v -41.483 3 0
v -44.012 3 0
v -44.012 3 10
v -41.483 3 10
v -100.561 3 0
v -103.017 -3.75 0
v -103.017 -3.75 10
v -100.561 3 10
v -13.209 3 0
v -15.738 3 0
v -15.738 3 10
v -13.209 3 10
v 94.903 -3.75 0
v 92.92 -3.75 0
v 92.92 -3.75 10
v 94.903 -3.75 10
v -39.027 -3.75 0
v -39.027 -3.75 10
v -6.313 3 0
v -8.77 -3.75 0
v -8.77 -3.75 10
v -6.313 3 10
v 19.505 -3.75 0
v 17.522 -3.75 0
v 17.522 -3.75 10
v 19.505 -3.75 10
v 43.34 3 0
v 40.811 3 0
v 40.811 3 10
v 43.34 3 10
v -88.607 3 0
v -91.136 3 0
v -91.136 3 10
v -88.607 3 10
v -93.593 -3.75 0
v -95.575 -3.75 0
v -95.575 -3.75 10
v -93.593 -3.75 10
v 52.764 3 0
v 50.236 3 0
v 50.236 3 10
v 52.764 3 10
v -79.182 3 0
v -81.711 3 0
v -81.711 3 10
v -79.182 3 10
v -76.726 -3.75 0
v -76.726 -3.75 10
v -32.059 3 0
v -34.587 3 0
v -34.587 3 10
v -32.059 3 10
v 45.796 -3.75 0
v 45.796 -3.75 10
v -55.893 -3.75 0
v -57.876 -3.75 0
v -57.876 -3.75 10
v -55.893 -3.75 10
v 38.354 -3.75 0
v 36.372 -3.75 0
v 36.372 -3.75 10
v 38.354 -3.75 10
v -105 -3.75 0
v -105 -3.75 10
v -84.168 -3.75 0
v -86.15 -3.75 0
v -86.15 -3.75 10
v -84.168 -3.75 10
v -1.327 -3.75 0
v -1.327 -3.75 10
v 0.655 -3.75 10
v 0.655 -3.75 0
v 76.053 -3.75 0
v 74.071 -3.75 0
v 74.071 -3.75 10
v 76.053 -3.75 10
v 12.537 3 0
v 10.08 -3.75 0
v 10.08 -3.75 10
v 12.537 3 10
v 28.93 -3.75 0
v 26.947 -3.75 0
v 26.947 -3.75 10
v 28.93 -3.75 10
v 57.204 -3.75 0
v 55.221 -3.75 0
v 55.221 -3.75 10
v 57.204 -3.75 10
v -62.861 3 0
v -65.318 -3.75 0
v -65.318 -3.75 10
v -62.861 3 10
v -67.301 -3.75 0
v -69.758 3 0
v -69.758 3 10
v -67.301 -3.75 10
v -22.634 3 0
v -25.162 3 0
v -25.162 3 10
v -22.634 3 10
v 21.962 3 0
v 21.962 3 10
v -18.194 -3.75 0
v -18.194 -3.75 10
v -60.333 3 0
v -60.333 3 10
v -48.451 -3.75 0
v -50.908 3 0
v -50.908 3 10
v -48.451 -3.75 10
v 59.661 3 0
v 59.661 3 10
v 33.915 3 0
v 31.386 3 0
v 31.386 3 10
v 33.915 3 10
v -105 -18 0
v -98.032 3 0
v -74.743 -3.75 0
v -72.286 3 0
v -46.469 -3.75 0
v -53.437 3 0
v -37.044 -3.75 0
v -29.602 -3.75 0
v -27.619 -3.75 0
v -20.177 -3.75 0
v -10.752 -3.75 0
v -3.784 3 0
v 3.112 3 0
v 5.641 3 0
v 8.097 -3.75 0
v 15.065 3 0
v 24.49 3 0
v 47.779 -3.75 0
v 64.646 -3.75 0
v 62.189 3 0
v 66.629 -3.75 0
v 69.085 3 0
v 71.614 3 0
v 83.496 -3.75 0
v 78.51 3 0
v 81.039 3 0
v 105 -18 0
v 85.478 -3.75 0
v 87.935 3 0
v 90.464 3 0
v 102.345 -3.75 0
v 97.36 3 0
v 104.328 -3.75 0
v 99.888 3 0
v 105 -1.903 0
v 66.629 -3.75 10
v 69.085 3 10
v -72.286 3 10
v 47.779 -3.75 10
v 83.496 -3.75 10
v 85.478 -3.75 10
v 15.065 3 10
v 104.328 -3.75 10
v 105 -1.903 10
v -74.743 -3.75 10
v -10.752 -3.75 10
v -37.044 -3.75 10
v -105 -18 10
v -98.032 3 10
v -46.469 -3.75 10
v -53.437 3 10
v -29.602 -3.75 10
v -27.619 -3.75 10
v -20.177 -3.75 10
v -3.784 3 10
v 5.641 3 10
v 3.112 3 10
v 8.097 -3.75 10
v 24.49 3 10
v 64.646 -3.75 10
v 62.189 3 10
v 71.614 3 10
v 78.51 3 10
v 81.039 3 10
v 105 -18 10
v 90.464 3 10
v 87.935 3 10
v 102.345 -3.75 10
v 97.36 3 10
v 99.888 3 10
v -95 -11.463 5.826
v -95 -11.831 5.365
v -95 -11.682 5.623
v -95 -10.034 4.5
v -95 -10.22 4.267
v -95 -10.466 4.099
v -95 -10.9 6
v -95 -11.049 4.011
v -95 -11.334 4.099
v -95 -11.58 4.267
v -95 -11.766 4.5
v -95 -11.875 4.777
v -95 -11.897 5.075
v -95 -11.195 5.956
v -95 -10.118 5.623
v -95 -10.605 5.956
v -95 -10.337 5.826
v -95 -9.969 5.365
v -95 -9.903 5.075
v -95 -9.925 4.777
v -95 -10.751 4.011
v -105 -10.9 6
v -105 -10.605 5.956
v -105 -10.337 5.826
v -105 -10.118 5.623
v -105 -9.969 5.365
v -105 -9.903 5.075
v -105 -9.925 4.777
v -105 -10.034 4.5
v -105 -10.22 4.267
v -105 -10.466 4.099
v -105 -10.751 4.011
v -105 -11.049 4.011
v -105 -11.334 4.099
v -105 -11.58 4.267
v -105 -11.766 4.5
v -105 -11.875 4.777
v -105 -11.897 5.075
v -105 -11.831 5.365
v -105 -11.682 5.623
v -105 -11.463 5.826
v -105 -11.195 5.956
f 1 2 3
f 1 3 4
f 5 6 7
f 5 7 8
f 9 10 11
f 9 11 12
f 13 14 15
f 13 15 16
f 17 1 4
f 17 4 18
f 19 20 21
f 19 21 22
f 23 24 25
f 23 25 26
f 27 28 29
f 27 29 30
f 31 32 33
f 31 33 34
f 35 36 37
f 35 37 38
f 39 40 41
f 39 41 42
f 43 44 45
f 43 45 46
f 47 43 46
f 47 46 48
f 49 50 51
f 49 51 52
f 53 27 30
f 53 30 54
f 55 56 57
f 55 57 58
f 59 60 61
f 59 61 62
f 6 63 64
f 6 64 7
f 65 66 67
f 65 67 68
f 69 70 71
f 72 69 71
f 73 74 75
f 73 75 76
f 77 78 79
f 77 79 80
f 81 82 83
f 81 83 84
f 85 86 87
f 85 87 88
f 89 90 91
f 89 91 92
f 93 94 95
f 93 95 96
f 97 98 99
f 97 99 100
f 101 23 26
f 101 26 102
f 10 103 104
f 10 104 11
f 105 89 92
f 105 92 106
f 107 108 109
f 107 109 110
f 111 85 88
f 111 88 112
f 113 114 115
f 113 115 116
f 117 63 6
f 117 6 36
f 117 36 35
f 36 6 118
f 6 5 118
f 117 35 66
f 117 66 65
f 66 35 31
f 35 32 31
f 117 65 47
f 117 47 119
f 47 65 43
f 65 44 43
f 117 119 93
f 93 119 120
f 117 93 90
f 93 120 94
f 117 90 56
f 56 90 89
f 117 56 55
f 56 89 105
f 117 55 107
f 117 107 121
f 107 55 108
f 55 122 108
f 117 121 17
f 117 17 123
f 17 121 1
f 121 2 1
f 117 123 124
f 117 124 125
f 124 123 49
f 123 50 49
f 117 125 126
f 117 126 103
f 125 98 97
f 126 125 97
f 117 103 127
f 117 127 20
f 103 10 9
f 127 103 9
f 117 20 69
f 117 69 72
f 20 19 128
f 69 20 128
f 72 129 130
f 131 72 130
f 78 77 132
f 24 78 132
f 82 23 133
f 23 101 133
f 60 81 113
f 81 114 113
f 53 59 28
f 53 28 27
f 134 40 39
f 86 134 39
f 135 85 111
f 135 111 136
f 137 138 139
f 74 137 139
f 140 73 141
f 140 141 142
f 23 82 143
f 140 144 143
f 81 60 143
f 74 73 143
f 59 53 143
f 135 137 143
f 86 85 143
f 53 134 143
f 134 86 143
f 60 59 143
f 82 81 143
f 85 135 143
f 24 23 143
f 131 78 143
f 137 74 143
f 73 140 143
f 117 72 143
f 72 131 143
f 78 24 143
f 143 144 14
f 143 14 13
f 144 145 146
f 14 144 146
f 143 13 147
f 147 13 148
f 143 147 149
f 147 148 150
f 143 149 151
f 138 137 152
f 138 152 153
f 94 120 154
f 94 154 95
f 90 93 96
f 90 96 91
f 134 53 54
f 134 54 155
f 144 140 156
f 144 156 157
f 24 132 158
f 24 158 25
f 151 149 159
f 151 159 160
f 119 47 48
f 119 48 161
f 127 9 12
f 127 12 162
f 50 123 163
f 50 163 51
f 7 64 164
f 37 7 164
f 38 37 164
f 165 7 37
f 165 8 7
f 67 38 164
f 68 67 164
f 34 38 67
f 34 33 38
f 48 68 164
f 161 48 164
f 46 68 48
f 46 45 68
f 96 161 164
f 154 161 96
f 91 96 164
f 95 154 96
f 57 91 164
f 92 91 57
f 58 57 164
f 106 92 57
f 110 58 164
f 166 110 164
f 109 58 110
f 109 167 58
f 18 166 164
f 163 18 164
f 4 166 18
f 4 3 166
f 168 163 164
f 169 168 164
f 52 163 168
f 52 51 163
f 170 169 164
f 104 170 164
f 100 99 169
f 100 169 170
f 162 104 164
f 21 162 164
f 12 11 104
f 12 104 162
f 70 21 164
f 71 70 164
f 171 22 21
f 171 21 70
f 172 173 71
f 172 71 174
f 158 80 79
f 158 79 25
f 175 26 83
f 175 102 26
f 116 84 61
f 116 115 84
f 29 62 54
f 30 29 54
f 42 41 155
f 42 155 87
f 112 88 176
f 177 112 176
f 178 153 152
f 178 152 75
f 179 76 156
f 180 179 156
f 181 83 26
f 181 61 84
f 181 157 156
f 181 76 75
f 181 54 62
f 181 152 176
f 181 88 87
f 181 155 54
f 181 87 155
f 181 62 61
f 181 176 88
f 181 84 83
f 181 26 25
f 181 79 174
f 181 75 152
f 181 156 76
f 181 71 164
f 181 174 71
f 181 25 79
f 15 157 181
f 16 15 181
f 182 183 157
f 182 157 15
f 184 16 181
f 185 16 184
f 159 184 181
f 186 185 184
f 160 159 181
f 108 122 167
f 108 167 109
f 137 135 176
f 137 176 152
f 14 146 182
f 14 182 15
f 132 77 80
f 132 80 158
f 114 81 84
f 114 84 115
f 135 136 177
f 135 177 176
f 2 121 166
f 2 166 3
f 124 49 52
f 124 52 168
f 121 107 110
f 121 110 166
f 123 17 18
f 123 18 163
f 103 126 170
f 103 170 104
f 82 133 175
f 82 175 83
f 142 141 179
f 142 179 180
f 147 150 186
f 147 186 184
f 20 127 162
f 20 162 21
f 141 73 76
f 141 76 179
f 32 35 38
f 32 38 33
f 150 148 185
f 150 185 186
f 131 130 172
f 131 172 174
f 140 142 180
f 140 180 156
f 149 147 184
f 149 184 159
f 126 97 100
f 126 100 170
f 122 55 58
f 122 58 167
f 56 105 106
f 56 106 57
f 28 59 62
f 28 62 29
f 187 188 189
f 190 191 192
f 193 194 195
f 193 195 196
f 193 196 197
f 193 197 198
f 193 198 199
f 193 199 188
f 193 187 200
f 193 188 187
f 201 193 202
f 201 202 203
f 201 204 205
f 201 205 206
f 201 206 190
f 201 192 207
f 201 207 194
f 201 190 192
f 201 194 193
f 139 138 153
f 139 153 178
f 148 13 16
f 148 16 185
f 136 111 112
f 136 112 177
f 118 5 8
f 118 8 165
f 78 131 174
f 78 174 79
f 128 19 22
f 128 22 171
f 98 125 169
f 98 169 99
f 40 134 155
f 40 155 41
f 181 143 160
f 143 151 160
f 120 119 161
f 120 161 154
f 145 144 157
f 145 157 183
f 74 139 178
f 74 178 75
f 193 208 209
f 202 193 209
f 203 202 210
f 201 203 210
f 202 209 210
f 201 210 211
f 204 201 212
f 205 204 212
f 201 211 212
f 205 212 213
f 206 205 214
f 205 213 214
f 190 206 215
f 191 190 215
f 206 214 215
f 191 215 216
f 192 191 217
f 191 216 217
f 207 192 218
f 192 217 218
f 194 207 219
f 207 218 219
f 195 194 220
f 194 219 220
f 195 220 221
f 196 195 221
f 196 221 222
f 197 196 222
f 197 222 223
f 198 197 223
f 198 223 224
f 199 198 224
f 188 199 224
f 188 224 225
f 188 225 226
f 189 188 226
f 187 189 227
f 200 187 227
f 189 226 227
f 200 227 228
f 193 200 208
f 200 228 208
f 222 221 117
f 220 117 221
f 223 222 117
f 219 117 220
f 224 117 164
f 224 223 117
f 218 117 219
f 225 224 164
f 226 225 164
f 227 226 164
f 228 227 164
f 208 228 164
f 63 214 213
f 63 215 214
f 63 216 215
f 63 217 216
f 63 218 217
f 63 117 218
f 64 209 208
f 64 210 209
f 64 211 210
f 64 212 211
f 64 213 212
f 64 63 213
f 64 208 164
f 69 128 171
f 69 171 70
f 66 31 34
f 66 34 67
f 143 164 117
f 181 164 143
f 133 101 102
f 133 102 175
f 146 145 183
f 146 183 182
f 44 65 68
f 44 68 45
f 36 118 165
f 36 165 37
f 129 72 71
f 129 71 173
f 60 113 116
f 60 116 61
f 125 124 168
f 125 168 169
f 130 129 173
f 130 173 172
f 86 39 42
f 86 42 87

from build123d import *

# Parameters (mm, degrees)
BOSS_EXTRUDE1_DEPTH = 10
SKETCH3_W           = 210
SKETCH3_H           = 10
BOSS_EXTRUDE2_DEPTH = 10
SKETCH4_R           = 1
CUT_EXTRUDE1_DEPTH  = 10


with BuildPart() as part:
    # Sketch1 → Boss-Extrude1 (new body)
    with BuildSketch(Plane(origin=(0, 0, 0), x_dir=(-1, 0, 0), z_dir=(0, 0, -1))):
        Polygon((-105, -1.902946103), (-105, -8), (105, -8), (105, -3.75), (103.017387777, -3.75), (100.560588695, 3), (98.032021121, 3), (95.575222039, -3.75), (93.592609816, -3.75), (91.135810735, 3), (88.60724316, 3), (86.150444078, -3.75), (84.167831855, -3.75), (81.711032774, 3), (79.182465199, 3), (76.725666118, -3.75), (74.743053894, -3.75), (72.286254813, 3), (69.757687238, 3), (67.300888157, -3.75), (65.318275934, -3.75), (62.861476852, 3), (60.332909277, 3), (57.876110196, -3.75), (55.893497973, -3.75), (53.436698891, 3), (50.908131317, 3), (48.451332235, -3.75), (46.468720012, -3.75), (44.011920931, 3), (41.483353356, 3), (39.026554275, -3.75), (37.043942051, -3.75), (34.58714297, 3), (32.058575395, 3), (29.601776314, -3.75), (27.61916409, -3.75), (25.162365009, 3), (22.633797434, 3), (20.176998353, -3.75), (18.19438613, -3.75), (15.737587048, 3), (13.209019474, 3), (10.752220392, -3.75), (8.769608169, -3.75), (6.312809088, 3), (3.784241513, 3), (1.327442432, -3.75), (-0.655169792, -3.75), (-3.111968873, 3), (-5.640536448, 3), (-8.097335529, -3.75), (-10.079947753, -3.75), (-12.536746834, 3), (-15.065314409, 3), (-17.52211349, -3.75), (-19.504725713, -3.75), (-21.961524795, 3), (-24.490092369, 3), (-26.946891451, -3.75), (-28.929503674, -3.75), (-31.386302755, 3), (-33.91487033, 3), (-36.371669412, -3.75), (-38.354281635, -3.75), (-40.811080716, 3), (-43.339648291, 3), (-45.796447372, -3.75), (-47.779059596, -3.75), (-50.235858677, 3), (-52.764426252, 3), (-55.221225333, -3.75), (-57.203837556, -3.75), (-59.660636638, 3), (-62.189204213, 3), (-64.646003294, -3.75), (-66.628615517, -3.75), (-69.085414599, 3), (-71.613982173, 3), (-74.070781255, -3.75), (-76.053393478, -3.75), (-78.510192559, 3), (-81.038760134, 3), (-83.495559215, -3.75), (-85.478171439, -3.75), (-87.93497052, 3), (-90.463538095, 3), (-92.920337176, -3.75), (-94.9029494, -3.75), (-97.359748481, 3), (-99.888316056, 3), (-102.345115137, -3.75), (-104.32772736, -3.75), align=None)
    extrude(amount=-BOSS_EXTRUDE1_DEPTH)

    # Sketch3 → Boss-Extrude2 (add)
    with BuildSketch(Plane.XZ.offset(8)):
        with Locations((0, 5)):
            Rectangle(SKETCH3_W, SKETCH3_H)
    extrude(amount=BOSS_EXTRUDE2_DEPTH)

    # Sketch4 → Cut-Extrude1 (cut)
    with BuildSketch(Plane.ZY.offset(105)):
        with Locations((5, -10.9)):
            Circle(SKETCH4_R)
    extrude(amount=-CUT_EXTRUDE1_DEPTH, mode=Mode.SUBTRACT)


solid = part.part
